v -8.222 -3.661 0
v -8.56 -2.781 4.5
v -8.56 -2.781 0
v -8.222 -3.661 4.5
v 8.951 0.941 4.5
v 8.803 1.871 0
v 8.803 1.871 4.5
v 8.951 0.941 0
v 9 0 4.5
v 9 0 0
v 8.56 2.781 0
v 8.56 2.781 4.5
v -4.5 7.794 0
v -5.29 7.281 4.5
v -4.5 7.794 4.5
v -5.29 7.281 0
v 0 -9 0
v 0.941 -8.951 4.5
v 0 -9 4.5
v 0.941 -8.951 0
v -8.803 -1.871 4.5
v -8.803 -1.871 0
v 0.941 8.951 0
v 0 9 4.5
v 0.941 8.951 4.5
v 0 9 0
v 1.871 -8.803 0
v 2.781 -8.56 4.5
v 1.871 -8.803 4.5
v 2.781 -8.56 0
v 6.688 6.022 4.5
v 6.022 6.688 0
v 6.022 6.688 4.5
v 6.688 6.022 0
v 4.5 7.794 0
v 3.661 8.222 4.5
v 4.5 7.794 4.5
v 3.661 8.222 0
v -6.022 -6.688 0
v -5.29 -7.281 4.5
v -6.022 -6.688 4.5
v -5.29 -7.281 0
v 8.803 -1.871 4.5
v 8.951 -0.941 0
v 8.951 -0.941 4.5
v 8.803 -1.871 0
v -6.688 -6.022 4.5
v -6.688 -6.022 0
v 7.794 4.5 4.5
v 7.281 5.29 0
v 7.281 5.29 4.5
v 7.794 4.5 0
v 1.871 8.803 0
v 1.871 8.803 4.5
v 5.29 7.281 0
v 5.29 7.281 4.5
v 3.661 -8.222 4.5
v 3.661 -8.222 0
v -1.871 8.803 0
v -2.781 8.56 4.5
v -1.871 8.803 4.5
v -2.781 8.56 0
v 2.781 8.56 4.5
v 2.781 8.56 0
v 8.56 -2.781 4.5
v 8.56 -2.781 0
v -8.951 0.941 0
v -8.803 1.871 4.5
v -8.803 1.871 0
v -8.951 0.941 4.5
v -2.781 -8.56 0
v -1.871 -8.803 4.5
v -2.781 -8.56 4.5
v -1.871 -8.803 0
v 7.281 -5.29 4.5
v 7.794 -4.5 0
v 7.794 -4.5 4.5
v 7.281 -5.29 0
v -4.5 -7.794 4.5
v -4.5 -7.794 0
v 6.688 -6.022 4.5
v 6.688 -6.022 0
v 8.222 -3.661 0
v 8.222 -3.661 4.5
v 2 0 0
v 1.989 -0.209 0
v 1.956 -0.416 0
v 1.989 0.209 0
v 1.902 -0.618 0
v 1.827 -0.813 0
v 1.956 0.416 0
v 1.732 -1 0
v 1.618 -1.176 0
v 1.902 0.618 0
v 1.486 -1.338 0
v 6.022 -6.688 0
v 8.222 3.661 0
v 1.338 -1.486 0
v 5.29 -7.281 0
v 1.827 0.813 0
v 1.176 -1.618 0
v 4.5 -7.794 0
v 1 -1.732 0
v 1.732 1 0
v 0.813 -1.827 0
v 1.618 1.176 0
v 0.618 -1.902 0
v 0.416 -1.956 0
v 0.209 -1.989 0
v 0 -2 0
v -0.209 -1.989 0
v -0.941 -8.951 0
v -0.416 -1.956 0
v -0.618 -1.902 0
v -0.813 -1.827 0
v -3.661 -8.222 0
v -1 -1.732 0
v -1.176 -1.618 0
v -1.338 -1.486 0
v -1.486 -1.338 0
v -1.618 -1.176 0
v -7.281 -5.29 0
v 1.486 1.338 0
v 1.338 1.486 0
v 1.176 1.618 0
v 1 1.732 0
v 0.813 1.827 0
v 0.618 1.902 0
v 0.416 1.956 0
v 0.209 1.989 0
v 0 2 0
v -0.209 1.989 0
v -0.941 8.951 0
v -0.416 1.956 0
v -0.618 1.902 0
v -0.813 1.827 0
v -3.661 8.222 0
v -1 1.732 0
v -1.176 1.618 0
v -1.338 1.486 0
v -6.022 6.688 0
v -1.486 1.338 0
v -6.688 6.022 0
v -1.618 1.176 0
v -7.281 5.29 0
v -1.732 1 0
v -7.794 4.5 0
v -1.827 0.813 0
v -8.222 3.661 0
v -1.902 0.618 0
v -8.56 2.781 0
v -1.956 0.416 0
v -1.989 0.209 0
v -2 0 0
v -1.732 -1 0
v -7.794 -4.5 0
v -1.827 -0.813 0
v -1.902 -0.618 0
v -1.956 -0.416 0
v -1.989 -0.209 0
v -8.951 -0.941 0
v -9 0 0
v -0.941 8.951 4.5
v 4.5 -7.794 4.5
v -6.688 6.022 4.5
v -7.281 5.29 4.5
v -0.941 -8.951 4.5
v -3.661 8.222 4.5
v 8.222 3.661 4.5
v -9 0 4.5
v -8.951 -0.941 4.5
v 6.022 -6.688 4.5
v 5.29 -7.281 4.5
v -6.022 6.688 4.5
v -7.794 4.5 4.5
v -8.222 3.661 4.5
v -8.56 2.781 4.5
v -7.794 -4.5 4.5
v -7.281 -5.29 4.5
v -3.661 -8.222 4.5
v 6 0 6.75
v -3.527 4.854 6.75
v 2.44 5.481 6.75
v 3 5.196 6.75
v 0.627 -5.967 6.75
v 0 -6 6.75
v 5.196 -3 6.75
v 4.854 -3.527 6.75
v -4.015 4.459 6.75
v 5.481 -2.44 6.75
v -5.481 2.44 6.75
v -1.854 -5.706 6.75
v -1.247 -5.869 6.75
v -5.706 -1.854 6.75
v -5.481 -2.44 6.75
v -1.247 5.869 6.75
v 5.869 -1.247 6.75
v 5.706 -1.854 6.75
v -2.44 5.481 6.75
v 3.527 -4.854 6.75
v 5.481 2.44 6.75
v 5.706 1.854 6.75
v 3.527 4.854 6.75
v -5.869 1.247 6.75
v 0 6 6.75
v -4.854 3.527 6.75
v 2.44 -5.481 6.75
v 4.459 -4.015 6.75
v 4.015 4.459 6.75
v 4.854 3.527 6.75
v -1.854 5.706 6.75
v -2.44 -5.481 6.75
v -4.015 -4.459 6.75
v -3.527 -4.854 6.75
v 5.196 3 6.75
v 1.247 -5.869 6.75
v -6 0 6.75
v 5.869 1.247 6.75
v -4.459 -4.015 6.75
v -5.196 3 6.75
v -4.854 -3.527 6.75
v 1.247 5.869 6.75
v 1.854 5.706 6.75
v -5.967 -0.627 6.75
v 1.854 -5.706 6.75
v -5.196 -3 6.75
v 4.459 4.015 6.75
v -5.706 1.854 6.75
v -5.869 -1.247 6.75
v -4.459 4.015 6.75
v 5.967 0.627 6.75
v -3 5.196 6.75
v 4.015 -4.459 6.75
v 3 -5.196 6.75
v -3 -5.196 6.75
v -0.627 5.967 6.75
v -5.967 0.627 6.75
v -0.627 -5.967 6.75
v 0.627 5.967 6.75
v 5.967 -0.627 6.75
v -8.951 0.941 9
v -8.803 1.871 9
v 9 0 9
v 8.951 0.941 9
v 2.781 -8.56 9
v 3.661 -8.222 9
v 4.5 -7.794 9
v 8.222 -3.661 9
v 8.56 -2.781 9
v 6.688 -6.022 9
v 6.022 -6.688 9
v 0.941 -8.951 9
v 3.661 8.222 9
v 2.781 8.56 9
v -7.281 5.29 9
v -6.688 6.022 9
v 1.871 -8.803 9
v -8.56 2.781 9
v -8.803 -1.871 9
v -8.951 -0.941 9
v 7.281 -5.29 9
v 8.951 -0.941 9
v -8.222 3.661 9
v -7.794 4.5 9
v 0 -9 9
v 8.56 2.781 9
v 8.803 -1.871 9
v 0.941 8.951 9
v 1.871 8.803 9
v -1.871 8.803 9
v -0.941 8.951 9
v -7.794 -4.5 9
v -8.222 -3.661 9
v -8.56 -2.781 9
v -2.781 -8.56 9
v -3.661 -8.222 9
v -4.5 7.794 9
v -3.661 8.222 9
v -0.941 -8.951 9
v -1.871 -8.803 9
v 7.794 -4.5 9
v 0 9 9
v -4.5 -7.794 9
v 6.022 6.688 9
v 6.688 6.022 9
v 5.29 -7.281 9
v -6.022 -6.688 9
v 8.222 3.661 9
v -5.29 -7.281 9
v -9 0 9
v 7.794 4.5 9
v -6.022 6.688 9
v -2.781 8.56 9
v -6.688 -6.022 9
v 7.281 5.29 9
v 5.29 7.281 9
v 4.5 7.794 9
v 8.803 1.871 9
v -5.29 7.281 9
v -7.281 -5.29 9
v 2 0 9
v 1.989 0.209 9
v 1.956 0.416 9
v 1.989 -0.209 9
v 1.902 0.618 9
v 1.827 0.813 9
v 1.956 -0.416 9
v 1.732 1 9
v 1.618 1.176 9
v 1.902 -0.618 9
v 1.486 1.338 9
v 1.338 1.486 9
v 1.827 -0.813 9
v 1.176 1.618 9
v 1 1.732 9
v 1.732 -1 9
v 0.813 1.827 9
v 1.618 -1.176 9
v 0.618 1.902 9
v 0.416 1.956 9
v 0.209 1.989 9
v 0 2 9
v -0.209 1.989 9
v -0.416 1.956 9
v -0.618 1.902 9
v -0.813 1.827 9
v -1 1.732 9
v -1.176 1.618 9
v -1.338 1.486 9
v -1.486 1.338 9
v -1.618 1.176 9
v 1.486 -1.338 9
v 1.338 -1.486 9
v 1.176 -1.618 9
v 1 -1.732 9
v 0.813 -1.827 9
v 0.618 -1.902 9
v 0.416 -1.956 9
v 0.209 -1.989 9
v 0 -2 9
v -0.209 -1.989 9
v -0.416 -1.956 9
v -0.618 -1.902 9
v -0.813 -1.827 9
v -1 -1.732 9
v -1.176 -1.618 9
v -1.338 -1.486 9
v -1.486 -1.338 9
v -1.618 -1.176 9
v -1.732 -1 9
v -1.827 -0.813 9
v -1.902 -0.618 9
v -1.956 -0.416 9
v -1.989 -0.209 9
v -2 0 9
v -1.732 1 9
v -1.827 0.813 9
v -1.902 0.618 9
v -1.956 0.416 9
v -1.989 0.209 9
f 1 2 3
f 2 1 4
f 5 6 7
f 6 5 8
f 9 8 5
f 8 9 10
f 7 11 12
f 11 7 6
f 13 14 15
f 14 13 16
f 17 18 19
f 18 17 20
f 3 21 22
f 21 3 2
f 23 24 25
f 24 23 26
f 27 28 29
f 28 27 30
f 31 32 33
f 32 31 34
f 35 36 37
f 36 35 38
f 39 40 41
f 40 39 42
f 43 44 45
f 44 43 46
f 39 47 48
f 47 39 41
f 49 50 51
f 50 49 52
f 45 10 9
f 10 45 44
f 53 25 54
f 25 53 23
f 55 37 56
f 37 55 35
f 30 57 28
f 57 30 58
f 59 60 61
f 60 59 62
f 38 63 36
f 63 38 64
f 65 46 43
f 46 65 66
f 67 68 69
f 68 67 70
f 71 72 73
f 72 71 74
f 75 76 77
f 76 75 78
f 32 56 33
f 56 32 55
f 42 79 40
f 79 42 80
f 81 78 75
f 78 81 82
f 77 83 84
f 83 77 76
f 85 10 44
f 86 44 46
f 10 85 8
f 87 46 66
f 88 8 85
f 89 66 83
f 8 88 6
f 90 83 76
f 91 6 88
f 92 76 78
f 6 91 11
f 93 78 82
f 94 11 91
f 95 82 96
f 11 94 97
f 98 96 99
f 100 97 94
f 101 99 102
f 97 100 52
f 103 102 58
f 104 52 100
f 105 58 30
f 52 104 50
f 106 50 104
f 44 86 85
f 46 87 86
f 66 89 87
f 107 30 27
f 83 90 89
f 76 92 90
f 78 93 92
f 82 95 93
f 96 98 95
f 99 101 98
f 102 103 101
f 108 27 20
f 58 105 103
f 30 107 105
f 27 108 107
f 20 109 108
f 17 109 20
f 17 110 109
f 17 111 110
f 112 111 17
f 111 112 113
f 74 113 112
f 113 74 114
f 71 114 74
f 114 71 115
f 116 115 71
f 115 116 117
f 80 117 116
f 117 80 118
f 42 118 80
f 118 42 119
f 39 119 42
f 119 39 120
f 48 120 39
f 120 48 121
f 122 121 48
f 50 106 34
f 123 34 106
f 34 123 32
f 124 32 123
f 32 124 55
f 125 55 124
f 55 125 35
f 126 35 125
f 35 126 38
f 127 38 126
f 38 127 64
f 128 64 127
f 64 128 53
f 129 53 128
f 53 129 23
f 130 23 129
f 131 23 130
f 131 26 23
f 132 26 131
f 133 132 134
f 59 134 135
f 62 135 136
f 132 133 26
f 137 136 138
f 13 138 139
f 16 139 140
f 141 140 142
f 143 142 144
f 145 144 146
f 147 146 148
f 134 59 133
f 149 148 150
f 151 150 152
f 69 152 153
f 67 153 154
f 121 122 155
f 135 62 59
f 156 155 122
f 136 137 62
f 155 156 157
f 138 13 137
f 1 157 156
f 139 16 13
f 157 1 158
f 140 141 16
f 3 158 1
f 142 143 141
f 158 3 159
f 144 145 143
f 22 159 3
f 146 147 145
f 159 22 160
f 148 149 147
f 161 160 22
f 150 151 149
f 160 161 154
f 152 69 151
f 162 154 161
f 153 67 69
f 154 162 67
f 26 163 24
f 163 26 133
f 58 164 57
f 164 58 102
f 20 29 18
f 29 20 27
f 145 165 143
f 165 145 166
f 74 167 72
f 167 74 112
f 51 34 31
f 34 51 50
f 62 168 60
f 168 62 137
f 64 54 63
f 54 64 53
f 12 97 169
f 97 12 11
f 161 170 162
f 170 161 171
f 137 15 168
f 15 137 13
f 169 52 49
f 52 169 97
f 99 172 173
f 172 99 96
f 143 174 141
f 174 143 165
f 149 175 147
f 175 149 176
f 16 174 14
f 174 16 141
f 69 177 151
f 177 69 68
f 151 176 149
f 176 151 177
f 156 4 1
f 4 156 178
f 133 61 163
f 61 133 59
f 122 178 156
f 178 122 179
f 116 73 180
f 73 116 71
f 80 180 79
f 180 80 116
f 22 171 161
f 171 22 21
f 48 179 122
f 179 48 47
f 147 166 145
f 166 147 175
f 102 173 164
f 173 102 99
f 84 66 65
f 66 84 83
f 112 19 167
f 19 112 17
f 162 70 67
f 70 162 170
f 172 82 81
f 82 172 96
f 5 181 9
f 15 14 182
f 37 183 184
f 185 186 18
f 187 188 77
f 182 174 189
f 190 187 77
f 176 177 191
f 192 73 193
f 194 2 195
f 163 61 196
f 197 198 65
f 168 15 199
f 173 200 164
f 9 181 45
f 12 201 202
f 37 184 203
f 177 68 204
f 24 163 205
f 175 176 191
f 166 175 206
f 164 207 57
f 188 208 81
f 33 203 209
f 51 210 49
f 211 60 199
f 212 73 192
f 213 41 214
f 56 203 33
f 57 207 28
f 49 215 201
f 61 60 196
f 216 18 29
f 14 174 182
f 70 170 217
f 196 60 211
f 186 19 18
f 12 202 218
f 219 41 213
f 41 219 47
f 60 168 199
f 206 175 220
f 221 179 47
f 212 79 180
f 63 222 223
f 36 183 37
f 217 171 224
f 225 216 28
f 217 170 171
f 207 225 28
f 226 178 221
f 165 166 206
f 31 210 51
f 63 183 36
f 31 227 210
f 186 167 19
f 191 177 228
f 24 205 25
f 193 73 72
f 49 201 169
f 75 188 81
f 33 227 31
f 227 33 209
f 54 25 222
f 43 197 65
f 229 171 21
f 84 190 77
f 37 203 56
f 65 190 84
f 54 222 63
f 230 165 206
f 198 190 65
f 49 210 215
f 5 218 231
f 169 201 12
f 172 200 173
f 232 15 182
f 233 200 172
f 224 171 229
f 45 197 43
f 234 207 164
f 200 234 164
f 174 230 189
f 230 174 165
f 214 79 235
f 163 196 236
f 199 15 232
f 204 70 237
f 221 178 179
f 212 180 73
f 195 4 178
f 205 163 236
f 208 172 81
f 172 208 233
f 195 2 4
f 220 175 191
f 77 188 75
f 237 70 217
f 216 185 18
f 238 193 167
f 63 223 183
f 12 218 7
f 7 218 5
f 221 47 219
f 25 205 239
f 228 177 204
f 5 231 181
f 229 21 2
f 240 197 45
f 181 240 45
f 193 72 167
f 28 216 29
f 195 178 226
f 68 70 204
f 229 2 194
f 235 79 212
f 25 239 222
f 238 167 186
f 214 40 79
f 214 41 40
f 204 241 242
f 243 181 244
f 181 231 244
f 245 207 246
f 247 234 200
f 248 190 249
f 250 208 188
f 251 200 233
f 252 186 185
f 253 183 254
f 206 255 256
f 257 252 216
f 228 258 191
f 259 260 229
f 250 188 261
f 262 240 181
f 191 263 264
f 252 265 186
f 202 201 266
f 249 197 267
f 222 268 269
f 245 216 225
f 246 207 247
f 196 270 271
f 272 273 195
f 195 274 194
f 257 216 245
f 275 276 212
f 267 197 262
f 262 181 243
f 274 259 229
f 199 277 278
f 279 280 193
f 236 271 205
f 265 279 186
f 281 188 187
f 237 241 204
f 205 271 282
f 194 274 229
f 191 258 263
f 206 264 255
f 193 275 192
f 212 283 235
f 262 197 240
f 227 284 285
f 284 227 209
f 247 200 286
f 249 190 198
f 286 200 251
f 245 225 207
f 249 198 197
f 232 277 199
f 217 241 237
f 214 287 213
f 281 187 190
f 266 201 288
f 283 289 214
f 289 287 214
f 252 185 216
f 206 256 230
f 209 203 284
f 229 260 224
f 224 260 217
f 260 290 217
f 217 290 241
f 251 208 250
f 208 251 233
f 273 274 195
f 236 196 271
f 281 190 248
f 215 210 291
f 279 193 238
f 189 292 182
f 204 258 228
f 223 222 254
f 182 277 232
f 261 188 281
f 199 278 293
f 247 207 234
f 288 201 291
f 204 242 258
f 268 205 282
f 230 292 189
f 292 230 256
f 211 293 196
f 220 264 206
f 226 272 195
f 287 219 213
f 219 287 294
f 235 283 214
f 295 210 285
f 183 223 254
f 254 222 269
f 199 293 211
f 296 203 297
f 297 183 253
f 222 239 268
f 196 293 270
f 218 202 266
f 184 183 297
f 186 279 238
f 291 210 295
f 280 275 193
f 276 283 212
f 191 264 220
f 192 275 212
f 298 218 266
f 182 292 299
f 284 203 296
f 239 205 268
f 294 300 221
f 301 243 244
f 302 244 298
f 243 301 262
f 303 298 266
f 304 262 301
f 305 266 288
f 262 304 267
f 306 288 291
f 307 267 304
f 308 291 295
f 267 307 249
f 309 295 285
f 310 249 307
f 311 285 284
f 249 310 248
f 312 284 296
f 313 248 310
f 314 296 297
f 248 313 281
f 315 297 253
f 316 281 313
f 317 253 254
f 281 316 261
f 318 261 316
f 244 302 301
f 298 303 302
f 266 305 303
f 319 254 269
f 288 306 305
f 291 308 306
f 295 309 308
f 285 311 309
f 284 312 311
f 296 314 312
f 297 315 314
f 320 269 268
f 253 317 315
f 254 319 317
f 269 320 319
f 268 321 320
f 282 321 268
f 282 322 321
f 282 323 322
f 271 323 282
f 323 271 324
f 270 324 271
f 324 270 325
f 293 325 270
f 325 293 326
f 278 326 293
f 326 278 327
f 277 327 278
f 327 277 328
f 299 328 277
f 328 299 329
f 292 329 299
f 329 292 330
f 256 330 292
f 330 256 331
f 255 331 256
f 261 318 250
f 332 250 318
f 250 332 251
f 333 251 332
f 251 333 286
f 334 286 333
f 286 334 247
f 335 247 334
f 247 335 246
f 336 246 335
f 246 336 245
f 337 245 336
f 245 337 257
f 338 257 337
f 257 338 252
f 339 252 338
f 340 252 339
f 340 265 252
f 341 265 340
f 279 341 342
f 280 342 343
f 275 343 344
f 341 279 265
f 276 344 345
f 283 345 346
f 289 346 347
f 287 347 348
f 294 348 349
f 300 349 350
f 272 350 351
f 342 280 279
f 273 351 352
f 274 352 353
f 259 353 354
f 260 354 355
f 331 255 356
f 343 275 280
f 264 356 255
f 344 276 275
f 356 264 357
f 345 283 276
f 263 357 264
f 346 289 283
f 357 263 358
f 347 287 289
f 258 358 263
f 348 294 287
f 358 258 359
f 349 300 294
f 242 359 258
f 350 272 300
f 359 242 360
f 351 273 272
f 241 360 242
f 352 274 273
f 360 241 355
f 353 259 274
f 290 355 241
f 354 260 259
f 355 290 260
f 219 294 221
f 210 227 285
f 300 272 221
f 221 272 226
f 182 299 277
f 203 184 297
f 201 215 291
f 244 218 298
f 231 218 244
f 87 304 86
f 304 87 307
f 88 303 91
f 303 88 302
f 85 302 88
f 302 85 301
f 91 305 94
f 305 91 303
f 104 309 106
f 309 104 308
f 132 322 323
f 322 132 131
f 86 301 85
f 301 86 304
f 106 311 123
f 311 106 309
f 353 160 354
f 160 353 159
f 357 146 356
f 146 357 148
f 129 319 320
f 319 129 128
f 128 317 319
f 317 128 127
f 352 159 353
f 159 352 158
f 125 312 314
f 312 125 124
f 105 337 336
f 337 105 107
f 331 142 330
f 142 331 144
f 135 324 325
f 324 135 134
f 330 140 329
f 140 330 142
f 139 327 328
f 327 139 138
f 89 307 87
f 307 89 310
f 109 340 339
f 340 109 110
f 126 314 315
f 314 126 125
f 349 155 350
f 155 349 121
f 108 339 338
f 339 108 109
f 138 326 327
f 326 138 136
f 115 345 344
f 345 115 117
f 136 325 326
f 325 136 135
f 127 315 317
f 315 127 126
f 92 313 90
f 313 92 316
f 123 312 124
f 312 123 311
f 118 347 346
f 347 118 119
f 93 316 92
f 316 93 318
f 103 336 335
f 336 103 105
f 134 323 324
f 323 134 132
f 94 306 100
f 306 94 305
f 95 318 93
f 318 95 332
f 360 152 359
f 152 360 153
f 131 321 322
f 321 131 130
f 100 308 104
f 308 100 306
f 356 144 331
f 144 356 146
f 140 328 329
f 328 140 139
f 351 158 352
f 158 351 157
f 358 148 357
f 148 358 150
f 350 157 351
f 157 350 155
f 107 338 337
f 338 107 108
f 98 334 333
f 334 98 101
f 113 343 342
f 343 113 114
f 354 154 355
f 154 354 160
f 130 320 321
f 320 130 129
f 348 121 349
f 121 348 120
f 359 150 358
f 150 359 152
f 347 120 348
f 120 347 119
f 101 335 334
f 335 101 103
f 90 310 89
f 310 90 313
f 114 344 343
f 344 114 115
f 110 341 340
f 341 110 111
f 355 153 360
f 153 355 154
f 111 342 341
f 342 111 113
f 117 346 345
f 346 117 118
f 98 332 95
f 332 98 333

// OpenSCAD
// V-groove guide wheel.
$fn = 60;
eps = 0.02;
bore_d = 4;
outer_d = 18;
width = 9;
groove_d = outer_d-6;
difference() {
    union() { cylinder(d=outer_d,h=width/2); translate([0,0,width/2]) cylinder(d1=outer_d,d2=groove_d,h=width/4); translate([0,0,3*width/4]) cylinder(d1=groove_d,d2=outer_d,h=width/4); }
    translate([0,0,-eps]) cylinder(d=bore_d,h=width+2*eps);
}
